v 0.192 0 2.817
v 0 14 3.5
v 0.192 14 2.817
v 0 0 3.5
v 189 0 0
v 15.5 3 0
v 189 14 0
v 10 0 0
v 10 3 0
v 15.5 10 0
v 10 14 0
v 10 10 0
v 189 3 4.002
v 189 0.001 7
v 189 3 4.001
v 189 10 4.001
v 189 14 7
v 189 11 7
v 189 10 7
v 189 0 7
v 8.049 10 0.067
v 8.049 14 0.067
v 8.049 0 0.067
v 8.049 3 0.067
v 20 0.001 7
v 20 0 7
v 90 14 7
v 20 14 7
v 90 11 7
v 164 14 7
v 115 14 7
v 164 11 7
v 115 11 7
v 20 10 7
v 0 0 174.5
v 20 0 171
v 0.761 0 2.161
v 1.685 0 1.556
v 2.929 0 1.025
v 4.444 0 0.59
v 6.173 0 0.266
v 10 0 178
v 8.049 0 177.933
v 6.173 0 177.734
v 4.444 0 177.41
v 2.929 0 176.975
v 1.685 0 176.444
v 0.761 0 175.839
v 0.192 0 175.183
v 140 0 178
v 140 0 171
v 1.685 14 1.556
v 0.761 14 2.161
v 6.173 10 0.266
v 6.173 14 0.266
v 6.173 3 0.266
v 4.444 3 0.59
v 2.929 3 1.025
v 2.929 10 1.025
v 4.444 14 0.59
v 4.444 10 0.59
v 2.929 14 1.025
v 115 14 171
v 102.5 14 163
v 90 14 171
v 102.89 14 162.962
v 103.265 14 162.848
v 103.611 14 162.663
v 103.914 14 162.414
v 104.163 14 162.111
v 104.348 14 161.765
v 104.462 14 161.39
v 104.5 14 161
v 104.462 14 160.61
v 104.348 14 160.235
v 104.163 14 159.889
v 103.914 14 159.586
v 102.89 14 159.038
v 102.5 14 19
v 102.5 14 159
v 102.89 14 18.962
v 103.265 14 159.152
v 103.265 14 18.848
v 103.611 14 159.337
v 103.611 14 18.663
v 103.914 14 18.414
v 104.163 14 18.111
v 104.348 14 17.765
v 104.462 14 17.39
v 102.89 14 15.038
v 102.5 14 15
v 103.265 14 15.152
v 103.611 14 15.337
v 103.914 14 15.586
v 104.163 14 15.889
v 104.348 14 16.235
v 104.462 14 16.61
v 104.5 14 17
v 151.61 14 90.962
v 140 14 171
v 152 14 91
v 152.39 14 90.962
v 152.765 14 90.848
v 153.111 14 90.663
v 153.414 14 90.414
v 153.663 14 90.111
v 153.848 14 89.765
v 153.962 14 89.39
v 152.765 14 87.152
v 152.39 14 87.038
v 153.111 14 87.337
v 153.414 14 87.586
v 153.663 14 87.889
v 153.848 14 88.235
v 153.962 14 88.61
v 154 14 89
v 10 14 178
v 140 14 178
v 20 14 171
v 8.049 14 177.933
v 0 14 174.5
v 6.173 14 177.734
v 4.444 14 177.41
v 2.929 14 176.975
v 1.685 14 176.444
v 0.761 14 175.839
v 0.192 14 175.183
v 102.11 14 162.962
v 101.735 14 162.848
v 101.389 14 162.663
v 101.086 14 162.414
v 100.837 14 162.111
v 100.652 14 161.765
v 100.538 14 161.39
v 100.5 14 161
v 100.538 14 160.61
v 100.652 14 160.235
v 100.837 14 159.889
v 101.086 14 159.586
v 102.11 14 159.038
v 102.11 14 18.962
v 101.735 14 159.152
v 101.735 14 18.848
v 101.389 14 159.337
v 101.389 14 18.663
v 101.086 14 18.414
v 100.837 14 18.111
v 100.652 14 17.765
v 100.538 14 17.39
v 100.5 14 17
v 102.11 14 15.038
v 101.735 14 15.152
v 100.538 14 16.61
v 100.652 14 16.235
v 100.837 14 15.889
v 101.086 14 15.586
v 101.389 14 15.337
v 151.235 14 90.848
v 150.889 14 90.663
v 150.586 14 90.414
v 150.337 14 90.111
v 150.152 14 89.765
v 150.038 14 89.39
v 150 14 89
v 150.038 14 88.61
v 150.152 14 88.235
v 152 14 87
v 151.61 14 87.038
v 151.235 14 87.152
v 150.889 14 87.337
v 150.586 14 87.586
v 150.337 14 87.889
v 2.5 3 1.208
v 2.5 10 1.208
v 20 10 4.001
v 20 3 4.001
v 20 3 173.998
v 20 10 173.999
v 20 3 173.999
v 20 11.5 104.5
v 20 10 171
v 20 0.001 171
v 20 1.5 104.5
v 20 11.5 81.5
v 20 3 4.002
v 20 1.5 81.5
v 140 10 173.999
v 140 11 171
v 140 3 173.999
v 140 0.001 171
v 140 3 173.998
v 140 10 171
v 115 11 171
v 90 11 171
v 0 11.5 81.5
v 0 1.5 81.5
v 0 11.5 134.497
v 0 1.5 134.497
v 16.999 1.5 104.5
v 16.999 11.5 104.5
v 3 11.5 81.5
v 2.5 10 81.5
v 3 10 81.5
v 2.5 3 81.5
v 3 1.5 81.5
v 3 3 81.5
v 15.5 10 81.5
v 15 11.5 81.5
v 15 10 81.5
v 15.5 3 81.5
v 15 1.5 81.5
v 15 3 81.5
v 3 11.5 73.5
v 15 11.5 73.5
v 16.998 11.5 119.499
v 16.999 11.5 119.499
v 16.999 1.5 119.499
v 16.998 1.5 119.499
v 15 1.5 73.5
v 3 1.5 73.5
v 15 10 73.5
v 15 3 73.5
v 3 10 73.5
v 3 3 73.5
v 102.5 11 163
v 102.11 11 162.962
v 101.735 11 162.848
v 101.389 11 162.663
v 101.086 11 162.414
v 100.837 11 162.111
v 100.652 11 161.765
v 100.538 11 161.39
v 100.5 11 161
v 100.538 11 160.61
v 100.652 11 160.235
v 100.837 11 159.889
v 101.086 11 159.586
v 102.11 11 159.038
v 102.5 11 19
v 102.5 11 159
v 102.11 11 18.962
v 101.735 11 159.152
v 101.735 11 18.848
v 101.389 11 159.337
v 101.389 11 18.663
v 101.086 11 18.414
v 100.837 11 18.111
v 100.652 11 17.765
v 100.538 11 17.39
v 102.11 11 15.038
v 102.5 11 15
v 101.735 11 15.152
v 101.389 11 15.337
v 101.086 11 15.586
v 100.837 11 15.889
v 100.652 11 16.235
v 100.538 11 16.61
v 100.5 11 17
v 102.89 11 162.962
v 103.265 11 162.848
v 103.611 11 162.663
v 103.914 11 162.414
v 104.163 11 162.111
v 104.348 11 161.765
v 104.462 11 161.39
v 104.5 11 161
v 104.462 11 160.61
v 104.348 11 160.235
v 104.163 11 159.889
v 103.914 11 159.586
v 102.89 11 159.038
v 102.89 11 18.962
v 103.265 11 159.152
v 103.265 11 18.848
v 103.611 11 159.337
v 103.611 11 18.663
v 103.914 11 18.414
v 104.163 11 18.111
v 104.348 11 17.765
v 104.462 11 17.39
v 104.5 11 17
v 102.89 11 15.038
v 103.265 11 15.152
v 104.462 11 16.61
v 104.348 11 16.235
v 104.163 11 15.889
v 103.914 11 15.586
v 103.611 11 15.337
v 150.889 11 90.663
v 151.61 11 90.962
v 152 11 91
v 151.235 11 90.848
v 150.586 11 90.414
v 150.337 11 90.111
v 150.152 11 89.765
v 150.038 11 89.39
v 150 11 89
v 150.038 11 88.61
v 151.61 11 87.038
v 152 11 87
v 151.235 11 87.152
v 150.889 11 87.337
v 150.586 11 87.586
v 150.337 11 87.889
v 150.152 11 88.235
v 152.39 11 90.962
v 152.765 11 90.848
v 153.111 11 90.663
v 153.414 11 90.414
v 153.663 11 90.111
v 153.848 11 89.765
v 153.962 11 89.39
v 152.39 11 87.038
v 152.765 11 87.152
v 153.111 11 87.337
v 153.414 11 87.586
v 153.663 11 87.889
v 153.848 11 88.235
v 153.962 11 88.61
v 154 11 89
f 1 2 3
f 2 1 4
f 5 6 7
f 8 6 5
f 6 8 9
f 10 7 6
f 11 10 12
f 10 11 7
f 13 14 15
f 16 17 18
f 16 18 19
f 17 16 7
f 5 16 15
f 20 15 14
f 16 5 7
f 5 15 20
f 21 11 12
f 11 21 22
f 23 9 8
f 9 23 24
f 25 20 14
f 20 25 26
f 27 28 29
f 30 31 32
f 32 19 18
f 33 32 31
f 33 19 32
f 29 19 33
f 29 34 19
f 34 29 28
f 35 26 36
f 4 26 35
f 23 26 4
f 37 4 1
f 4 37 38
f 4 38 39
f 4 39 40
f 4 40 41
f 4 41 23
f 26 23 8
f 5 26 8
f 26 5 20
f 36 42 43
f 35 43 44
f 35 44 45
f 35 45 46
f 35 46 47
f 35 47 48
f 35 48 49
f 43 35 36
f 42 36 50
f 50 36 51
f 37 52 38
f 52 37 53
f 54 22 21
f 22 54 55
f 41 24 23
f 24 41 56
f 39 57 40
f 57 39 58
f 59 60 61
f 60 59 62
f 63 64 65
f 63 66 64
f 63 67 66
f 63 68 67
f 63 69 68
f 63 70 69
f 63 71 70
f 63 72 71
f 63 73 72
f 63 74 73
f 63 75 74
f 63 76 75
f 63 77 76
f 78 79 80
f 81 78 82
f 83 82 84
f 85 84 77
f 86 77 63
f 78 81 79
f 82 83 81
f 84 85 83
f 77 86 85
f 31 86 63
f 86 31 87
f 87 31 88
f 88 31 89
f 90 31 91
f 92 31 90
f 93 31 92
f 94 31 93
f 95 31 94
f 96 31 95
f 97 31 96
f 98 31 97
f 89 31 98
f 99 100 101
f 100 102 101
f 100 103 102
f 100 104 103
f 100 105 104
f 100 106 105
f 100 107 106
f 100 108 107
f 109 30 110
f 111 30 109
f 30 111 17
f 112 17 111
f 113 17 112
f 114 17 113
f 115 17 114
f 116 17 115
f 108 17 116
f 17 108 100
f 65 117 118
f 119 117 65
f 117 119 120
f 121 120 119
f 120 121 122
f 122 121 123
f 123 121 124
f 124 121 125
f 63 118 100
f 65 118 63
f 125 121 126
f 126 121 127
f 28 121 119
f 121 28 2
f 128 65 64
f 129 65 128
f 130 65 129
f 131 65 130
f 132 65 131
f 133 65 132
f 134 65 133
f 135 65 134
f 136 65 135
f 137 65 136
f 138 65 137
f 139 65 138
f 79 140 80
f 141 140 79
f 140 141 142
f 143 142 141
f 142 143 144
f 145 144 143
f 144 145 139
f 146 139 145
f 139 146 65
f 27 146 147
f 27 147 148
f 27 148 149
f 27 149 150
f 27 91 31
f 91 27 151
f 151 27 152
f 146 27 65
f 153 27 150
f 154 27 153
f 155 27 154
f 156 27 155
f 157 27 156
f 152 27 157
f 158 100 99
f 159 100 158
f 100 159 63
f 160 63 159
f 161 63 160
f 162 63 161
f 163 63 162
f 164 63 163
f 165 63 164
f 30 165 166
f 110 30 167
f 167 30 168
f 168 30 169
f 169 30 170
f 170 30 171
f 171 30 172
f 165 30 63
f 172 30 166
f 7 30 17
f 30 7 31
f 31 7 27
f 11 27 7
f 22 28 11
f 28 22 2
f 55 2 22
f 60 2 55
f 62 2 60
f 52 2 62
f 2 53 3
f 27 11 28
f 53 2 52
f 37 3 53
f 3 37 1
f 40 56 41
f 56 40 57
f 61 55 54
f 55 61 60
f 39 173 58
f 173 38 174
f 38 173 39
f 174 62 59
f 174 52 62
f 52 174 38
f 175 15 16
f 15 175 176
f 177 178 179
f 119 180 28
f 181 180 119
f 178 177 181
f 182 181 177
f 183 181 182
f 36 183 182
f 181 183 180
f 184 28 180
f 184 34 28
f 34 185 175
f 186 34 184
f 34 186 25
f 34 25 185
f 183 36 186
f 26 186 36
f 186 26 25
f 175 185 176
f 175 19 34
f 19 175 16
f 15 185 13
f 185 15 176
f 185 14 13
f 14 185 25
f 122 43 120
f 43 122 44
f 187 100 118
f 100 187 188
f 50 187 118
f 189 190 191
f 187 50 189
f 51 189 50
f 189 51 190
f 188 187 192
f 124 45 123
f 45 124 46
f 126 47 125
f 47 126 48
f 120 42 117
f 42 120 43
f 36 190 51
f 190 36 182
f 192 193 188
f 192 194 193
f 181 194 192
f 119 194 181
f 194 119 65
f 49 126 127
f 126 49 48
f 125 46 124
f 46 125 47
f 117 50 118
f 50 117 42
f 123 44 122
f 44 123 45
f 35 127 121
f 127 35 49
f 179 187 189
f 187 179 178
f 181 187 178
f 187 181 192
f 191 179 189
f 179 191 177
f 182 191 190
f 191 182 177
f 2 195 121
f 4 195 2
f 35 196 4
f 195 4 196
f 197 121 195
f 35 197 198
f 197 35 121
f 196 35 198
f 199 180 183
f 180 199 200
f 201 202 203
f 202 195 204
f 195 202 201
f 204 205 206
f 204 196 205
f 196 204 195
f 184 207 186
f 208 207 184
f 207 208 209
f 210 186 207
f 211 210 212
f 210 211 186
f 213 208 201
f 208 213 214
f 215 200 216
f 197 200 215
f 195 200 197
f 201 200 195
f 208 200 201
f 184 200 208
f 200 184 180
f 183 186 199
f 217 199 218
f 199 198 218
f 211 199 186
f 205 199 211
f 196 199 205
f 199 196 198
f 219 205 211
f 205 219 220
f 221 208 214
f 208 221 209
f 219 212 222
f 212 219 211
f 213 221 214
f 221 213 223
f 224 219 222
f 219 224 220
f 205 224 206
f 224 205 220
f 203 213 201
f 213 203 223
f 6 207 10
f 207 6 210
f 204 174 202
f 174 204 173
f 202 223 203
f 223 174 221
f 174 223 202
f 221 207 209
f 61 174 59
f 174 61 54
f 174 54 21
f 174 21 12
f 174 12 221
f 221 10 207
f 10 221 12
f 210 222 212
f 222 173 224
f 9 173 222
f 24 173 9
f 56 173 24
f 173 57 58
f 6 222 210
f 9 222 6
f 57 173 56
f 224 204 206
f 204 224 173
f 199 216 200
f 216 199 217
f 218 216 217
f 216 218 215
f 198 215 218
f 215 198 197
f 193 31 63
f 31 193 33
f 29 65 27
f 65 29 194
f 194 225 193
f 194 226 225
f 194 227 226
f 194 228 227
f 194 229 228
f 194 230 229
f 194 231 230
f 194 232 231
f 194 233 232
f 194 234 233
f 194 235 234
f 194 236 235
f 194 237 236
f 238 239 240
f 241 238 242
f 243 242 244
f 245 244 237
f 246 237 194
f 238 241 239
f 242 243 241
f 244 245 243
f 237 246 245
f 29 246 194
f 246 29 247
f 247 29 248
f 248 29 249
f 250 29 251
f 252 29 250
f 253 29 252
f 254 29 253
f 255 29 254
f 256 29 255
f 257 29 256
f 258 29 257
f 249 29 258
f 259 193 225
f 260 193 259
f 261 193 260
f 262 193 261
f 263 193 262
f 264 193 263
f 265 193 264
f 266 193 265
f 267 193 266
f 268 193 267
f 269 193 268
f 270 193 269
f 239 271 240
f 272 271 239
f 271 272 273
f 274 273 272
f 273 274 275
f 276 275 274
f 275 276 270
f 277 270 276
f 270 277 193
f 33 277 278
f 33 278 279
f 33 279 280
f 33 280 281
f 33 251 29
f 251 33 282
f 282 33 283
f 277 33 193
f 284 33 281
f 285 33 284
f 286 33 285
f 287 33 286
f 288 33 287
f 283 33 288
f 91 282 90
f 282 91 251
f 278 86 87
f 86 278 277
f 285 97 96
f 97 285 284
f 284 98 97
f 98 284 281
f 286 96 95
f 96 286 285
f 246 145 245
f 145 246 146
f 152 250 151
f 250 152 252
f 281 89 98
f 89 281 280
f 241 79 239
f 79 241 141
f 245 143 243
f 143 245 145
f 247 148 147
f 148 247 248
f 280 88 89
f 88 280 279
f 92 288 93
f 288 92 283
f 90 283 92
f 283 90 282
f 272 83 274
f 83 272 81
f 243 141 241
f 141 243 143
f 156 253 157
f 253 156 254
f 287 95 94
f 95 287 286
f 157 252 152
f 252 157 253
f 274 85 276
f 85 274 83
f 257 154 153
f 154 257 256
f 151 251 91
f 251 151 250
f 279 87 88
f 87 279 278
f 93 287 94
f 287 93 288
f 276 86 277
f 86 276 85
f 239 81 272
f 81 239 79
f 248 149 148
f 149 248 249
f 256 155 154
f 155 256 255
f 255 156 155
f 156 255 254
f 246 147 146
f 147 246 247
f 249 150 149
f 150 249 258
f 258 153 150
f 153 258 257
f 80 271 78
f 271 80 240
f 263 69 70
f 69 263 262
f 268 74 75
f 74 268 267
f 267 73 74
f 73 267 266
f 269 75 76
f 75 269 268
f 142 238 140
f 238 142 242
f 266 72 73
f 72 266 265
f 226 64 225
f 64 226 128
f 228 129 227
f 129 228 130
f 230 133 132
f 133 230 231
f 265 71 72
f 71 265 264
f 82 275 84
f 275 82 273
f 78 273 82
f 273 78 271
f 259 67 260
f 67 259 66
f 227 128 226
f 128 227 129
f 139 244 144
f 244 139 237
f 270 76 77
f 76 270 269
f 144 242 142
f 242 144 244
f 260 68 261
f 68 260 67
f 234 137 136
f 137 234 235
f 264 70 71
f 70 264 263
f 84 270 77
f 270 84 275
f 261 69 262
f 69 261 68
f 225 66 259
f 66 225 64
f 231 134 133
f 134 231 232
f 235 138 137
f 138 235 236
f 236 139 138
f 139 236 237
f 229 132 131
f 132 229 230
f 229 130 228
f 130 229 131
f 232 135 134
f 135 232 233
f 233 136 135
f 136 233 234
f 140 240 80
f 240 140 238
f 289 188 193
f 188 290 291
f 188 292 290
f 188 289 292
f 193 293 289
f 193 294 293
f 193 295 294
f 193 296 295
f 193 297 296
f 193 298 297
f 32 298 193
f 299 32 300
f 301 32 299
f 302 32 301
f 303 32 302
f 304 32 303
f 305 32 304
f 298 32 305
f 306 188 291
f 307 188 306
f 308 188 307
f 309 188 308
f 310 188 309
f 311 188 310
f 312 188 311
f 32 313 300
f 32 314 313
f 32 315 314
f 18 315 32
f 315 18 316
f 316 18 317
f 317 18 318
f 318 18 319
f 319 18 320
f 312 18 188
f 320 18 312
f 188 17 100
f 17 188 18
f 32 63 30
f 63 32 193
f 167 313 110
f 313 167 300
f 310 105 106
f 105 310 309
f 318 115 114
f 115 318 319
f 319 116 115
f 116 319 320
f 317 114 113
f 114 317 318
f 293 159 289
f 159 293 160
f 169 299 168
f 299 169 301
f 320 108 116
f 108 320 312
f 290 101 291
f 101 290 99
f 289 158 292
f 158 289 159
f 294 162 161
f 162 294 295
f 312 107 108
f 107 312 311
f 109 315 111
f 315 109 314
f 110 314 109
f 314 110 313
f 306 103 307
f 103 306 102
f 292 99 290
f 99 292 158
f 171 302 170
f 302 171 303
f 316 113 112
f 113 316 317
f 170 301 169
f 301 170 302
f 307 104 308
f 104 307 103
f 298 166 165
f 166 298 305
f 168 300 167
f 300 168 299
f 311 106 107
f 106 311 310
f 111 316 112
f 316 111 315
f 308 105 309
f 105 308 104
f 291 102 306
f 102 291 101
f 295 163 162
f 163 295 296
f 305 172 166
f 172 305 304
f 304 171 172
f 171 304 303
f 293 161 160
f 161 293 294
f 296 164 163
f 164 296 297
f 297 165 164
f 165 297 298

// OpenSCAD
// The dimensions of the tablet.
tablet_height = 170;
tablet_thickness = 7;

// The dimensions of the holder's top and bottom segments.
bottom_width = 169;
top_width = 120;

// The height (depth) of the groove lip
groove_height = 3;
// The thickness of the groove lip, front and back.
groove_thickness = 3;
groove_thickness_back = 1;

// The amount of material below and above the tablet in the groove.
bottom_thickness = 4;
top_thickness = 4;

// The size of the supports on the back.
support_thickness = 3;
support_width = 25;

// The size of the angle plug
angle_plug_thickness = 10;
angle_plug_width= 17;
// The height of the top angled part of the plug.
angle_plug_top_height = 15;
// The size of the bottom straight part of the plug.
angle_plug_bottom_height = 8;
angle_plug_bottom_width = 12;

// The size of the cable going up to the angle plug.
cable_thickness = 7;
cable_width = 13;

// How much material to keep left of angle plug.
angle_plug_left = 3;

// Diameter of the screw holes.
screw_hole_size = 4;
// Distance from the sides to the screw holes on the vertical support.
screw_hole_distance = 10;

/* [Hidden] */

$fn = 32;

total_thickness = support_thickness + groove_thickness_back + tablet_thickness + groove_thickness;
total_height = bottom_thickness + tablet_height + top_thickness;
inner_height = tablet_height - groove_height * 2;
top_height = groove_height + top_thickness;
bottom_height = groove_height + bottom_thickness;
left_width = angle_plug_width + angle_plug_left;
angle_plug_height = angle_plug_top_height + angle_plug_bottom_height;

difference() {
    // Main body.
    union() {
        left();
        bottom();
        top();
    }
    plug();
}

// Supports.
translate([0, total_thickness - support_thickness, bottom_height]) {
    top_right = left_width + top_width - support_width;
    bottom_right = left_width + bottom_width;

    // Straight up.
    translate([top_right - support_width, 0, 0]) {
        difference() {
            cube([support_width, support_thickness, inner_height]);
            translate([support_width / 2, 0, screw_hole_distance]) {
                screw_hole();
            }
            translate([support_width / 2, 0, inner_height - screw_hole_distance]) {
                screw_hole();
            }
        }
    }

    // Bottom right to top right.
    points = [
      [bottom_right - support_width, 0, 0], // 0
      [bottom_right, 0, 0], // 1
      [bottom_right, support_thickness, 0], // 2
      [bottom_right - support_width, support_thickness, 0], // 3
      [top_right, 0, inner_height], // 4
      [top_right + support_width, 0, inner_height], // 5
      [top_right + support_width, support_thickness, inner_height], // 6
      [top_right, support_thickness, inner_height], // 7
    ];
    faces = [
      [0,1,2,3], // Bottom
      [4,5,1,0], // Front
      [7,6,5,4], // Top
      [5,6,2,1], // Right
      [6,7,3,2], // Back
      [7,4,0,3], // Left
    ];
    difference() {
        polyhedron(points, faces);
        translate([top_right + (bottom_right - top_right) / 2, 0, inner_height / 2]) {
            screw_hole();
        }
    }
}

/* Modules */

module screw_hole() {
    translate([0, -0.001, 0]) {
        rotate([-90, 0, 0]) {
            cylinder(support_thickness + 0.002, d = screw_hole_size);
        }
    }
}

module plug() {
    center_y = groove_thickness + tablet_thickness / 2;
    plug_z = bottom_height + inner_height / 2 - angle_plug_top_height / 2;

    // Angle plug top part.
    translate([
        -0.001,
        center_y - angle_plug_thickness / 2,
        plug_z,
    ]) {
        cube([left_width + 0.002, angle_plug_thickness, angle_plug_height]);
    }

    // Angle plug bottom part.
    translate([
        angle_plug_left,
        center_y - angle_plug_thickness / 2,
        plug_z - angle_plug_bottom_height,
    ]) {
        cube([angle_plug_bottom_width, angle_plug_thickness, angle_plug_bottom_height + 0.001]);
    }

    // The cable running up to the angle plug.
    translate([
        angle_plug_left - (cable_width - angle_plug_bottom_width) / 2,
        center_y - cable_thickness / 2,
        -0.001,
    ]) {
        cube([cable_width, cable_thickness, plug_z + 0.002]);
    }

    // Room above the plug.
    translate([
        -0.001,
        center_y - angle_plug_thickness / 2,
        plug_z + angle_plug_height - 0.001,
    ]) {
        cube([angle_plug_width, angle_plug_thickness, angle_plug_top_height]);
    }

    // Angled guiding section above the plug.
    translate([
        angle_plug_width - 0.001,
        center_y - angle_plug_thickness / 2,
        plug_z + angle_plug_height + angle_plug_top_height - 0.002,
    ]) {
        rotate([0, 0, 90]) {
            prism(angle_plug_thickness, angle_plug_width, angle_plug_top_height);
        }
    }
}

module left() {
    hull() {
        translate([0, 0, bottom_height]) {
            cube([left_width, total_thickness, inner_height]);
        }
        bottomLeft();
        topLeft();
    }
}

module bottom() {
    difference() {
        hull() {
            translate([left_width, 0, 0]) {
                cube([bottom_width, total_thickness, bottom_height]);
            }
            bottomLeft();
        }
        translate([left_width, groove_thickness, bottom_height - groove_height + 0.001]) {
            cube([bottom_width + 0.001, tablet_thickness, groove_height]);
        }
        translate([left_width, 0, bottom_height + 0.001]) {
            mirror([0, 0, 1]) {
                prism(bottom_width + 0.001, groove_thickness + 0.001, groove_height);
            }
        }
    }
}

module top() {
    difference() {
        hull() {
            translate([left_width, 0, total_height - top_height]) {
                cube([top_width, total_thickness, top_height]);
            }
            topLeft();
        }
        translate([left_width, groove_thickness, total_height - top_height - 0.001]) {
            cube([top_width + 0.001, tablet_thickness, groove_height]);
        }
        translate([left_width, 0, total_height - top_height - 0.001]) {
            prism(top_width + 0.001, groove_thickness + 0.001, groove_height);
        }
    }
}

module bottomLeft() {
    translate([left_width / 2, 0, bottom_height / 2]) {
        scale([left_width, 1, bottom_height]) {
            rotate([-90, 0, 0]) {
                cylinder(total_thickness, d = 1);
            }
        }
    }
}
module topLeft() {
    translate([left_width / 2, 0, total_height - top_height / 2]) {
        scale([left_width, 1, top_height]) {
            rotate([-90, 0, 0]) {
                cylinder(total_thickness, d = 1);
            }
        }
    }
}

module prism(l, w, h) {
    polyhedron(
        points=[[0,0,0], [0,w,h], [l,w,h], [l,0,0], [0,w,0], [l,w,0]],
        faces=[
            [0,1,2,3], // Top sloping face
            [2,1,4,5], // Vertical rectangular face
            [0,3,5,4], // Bottom face
            [0,4,1], // Rear triangular face
            [3,2,5], // Front triangular face
        ]
    );
}
